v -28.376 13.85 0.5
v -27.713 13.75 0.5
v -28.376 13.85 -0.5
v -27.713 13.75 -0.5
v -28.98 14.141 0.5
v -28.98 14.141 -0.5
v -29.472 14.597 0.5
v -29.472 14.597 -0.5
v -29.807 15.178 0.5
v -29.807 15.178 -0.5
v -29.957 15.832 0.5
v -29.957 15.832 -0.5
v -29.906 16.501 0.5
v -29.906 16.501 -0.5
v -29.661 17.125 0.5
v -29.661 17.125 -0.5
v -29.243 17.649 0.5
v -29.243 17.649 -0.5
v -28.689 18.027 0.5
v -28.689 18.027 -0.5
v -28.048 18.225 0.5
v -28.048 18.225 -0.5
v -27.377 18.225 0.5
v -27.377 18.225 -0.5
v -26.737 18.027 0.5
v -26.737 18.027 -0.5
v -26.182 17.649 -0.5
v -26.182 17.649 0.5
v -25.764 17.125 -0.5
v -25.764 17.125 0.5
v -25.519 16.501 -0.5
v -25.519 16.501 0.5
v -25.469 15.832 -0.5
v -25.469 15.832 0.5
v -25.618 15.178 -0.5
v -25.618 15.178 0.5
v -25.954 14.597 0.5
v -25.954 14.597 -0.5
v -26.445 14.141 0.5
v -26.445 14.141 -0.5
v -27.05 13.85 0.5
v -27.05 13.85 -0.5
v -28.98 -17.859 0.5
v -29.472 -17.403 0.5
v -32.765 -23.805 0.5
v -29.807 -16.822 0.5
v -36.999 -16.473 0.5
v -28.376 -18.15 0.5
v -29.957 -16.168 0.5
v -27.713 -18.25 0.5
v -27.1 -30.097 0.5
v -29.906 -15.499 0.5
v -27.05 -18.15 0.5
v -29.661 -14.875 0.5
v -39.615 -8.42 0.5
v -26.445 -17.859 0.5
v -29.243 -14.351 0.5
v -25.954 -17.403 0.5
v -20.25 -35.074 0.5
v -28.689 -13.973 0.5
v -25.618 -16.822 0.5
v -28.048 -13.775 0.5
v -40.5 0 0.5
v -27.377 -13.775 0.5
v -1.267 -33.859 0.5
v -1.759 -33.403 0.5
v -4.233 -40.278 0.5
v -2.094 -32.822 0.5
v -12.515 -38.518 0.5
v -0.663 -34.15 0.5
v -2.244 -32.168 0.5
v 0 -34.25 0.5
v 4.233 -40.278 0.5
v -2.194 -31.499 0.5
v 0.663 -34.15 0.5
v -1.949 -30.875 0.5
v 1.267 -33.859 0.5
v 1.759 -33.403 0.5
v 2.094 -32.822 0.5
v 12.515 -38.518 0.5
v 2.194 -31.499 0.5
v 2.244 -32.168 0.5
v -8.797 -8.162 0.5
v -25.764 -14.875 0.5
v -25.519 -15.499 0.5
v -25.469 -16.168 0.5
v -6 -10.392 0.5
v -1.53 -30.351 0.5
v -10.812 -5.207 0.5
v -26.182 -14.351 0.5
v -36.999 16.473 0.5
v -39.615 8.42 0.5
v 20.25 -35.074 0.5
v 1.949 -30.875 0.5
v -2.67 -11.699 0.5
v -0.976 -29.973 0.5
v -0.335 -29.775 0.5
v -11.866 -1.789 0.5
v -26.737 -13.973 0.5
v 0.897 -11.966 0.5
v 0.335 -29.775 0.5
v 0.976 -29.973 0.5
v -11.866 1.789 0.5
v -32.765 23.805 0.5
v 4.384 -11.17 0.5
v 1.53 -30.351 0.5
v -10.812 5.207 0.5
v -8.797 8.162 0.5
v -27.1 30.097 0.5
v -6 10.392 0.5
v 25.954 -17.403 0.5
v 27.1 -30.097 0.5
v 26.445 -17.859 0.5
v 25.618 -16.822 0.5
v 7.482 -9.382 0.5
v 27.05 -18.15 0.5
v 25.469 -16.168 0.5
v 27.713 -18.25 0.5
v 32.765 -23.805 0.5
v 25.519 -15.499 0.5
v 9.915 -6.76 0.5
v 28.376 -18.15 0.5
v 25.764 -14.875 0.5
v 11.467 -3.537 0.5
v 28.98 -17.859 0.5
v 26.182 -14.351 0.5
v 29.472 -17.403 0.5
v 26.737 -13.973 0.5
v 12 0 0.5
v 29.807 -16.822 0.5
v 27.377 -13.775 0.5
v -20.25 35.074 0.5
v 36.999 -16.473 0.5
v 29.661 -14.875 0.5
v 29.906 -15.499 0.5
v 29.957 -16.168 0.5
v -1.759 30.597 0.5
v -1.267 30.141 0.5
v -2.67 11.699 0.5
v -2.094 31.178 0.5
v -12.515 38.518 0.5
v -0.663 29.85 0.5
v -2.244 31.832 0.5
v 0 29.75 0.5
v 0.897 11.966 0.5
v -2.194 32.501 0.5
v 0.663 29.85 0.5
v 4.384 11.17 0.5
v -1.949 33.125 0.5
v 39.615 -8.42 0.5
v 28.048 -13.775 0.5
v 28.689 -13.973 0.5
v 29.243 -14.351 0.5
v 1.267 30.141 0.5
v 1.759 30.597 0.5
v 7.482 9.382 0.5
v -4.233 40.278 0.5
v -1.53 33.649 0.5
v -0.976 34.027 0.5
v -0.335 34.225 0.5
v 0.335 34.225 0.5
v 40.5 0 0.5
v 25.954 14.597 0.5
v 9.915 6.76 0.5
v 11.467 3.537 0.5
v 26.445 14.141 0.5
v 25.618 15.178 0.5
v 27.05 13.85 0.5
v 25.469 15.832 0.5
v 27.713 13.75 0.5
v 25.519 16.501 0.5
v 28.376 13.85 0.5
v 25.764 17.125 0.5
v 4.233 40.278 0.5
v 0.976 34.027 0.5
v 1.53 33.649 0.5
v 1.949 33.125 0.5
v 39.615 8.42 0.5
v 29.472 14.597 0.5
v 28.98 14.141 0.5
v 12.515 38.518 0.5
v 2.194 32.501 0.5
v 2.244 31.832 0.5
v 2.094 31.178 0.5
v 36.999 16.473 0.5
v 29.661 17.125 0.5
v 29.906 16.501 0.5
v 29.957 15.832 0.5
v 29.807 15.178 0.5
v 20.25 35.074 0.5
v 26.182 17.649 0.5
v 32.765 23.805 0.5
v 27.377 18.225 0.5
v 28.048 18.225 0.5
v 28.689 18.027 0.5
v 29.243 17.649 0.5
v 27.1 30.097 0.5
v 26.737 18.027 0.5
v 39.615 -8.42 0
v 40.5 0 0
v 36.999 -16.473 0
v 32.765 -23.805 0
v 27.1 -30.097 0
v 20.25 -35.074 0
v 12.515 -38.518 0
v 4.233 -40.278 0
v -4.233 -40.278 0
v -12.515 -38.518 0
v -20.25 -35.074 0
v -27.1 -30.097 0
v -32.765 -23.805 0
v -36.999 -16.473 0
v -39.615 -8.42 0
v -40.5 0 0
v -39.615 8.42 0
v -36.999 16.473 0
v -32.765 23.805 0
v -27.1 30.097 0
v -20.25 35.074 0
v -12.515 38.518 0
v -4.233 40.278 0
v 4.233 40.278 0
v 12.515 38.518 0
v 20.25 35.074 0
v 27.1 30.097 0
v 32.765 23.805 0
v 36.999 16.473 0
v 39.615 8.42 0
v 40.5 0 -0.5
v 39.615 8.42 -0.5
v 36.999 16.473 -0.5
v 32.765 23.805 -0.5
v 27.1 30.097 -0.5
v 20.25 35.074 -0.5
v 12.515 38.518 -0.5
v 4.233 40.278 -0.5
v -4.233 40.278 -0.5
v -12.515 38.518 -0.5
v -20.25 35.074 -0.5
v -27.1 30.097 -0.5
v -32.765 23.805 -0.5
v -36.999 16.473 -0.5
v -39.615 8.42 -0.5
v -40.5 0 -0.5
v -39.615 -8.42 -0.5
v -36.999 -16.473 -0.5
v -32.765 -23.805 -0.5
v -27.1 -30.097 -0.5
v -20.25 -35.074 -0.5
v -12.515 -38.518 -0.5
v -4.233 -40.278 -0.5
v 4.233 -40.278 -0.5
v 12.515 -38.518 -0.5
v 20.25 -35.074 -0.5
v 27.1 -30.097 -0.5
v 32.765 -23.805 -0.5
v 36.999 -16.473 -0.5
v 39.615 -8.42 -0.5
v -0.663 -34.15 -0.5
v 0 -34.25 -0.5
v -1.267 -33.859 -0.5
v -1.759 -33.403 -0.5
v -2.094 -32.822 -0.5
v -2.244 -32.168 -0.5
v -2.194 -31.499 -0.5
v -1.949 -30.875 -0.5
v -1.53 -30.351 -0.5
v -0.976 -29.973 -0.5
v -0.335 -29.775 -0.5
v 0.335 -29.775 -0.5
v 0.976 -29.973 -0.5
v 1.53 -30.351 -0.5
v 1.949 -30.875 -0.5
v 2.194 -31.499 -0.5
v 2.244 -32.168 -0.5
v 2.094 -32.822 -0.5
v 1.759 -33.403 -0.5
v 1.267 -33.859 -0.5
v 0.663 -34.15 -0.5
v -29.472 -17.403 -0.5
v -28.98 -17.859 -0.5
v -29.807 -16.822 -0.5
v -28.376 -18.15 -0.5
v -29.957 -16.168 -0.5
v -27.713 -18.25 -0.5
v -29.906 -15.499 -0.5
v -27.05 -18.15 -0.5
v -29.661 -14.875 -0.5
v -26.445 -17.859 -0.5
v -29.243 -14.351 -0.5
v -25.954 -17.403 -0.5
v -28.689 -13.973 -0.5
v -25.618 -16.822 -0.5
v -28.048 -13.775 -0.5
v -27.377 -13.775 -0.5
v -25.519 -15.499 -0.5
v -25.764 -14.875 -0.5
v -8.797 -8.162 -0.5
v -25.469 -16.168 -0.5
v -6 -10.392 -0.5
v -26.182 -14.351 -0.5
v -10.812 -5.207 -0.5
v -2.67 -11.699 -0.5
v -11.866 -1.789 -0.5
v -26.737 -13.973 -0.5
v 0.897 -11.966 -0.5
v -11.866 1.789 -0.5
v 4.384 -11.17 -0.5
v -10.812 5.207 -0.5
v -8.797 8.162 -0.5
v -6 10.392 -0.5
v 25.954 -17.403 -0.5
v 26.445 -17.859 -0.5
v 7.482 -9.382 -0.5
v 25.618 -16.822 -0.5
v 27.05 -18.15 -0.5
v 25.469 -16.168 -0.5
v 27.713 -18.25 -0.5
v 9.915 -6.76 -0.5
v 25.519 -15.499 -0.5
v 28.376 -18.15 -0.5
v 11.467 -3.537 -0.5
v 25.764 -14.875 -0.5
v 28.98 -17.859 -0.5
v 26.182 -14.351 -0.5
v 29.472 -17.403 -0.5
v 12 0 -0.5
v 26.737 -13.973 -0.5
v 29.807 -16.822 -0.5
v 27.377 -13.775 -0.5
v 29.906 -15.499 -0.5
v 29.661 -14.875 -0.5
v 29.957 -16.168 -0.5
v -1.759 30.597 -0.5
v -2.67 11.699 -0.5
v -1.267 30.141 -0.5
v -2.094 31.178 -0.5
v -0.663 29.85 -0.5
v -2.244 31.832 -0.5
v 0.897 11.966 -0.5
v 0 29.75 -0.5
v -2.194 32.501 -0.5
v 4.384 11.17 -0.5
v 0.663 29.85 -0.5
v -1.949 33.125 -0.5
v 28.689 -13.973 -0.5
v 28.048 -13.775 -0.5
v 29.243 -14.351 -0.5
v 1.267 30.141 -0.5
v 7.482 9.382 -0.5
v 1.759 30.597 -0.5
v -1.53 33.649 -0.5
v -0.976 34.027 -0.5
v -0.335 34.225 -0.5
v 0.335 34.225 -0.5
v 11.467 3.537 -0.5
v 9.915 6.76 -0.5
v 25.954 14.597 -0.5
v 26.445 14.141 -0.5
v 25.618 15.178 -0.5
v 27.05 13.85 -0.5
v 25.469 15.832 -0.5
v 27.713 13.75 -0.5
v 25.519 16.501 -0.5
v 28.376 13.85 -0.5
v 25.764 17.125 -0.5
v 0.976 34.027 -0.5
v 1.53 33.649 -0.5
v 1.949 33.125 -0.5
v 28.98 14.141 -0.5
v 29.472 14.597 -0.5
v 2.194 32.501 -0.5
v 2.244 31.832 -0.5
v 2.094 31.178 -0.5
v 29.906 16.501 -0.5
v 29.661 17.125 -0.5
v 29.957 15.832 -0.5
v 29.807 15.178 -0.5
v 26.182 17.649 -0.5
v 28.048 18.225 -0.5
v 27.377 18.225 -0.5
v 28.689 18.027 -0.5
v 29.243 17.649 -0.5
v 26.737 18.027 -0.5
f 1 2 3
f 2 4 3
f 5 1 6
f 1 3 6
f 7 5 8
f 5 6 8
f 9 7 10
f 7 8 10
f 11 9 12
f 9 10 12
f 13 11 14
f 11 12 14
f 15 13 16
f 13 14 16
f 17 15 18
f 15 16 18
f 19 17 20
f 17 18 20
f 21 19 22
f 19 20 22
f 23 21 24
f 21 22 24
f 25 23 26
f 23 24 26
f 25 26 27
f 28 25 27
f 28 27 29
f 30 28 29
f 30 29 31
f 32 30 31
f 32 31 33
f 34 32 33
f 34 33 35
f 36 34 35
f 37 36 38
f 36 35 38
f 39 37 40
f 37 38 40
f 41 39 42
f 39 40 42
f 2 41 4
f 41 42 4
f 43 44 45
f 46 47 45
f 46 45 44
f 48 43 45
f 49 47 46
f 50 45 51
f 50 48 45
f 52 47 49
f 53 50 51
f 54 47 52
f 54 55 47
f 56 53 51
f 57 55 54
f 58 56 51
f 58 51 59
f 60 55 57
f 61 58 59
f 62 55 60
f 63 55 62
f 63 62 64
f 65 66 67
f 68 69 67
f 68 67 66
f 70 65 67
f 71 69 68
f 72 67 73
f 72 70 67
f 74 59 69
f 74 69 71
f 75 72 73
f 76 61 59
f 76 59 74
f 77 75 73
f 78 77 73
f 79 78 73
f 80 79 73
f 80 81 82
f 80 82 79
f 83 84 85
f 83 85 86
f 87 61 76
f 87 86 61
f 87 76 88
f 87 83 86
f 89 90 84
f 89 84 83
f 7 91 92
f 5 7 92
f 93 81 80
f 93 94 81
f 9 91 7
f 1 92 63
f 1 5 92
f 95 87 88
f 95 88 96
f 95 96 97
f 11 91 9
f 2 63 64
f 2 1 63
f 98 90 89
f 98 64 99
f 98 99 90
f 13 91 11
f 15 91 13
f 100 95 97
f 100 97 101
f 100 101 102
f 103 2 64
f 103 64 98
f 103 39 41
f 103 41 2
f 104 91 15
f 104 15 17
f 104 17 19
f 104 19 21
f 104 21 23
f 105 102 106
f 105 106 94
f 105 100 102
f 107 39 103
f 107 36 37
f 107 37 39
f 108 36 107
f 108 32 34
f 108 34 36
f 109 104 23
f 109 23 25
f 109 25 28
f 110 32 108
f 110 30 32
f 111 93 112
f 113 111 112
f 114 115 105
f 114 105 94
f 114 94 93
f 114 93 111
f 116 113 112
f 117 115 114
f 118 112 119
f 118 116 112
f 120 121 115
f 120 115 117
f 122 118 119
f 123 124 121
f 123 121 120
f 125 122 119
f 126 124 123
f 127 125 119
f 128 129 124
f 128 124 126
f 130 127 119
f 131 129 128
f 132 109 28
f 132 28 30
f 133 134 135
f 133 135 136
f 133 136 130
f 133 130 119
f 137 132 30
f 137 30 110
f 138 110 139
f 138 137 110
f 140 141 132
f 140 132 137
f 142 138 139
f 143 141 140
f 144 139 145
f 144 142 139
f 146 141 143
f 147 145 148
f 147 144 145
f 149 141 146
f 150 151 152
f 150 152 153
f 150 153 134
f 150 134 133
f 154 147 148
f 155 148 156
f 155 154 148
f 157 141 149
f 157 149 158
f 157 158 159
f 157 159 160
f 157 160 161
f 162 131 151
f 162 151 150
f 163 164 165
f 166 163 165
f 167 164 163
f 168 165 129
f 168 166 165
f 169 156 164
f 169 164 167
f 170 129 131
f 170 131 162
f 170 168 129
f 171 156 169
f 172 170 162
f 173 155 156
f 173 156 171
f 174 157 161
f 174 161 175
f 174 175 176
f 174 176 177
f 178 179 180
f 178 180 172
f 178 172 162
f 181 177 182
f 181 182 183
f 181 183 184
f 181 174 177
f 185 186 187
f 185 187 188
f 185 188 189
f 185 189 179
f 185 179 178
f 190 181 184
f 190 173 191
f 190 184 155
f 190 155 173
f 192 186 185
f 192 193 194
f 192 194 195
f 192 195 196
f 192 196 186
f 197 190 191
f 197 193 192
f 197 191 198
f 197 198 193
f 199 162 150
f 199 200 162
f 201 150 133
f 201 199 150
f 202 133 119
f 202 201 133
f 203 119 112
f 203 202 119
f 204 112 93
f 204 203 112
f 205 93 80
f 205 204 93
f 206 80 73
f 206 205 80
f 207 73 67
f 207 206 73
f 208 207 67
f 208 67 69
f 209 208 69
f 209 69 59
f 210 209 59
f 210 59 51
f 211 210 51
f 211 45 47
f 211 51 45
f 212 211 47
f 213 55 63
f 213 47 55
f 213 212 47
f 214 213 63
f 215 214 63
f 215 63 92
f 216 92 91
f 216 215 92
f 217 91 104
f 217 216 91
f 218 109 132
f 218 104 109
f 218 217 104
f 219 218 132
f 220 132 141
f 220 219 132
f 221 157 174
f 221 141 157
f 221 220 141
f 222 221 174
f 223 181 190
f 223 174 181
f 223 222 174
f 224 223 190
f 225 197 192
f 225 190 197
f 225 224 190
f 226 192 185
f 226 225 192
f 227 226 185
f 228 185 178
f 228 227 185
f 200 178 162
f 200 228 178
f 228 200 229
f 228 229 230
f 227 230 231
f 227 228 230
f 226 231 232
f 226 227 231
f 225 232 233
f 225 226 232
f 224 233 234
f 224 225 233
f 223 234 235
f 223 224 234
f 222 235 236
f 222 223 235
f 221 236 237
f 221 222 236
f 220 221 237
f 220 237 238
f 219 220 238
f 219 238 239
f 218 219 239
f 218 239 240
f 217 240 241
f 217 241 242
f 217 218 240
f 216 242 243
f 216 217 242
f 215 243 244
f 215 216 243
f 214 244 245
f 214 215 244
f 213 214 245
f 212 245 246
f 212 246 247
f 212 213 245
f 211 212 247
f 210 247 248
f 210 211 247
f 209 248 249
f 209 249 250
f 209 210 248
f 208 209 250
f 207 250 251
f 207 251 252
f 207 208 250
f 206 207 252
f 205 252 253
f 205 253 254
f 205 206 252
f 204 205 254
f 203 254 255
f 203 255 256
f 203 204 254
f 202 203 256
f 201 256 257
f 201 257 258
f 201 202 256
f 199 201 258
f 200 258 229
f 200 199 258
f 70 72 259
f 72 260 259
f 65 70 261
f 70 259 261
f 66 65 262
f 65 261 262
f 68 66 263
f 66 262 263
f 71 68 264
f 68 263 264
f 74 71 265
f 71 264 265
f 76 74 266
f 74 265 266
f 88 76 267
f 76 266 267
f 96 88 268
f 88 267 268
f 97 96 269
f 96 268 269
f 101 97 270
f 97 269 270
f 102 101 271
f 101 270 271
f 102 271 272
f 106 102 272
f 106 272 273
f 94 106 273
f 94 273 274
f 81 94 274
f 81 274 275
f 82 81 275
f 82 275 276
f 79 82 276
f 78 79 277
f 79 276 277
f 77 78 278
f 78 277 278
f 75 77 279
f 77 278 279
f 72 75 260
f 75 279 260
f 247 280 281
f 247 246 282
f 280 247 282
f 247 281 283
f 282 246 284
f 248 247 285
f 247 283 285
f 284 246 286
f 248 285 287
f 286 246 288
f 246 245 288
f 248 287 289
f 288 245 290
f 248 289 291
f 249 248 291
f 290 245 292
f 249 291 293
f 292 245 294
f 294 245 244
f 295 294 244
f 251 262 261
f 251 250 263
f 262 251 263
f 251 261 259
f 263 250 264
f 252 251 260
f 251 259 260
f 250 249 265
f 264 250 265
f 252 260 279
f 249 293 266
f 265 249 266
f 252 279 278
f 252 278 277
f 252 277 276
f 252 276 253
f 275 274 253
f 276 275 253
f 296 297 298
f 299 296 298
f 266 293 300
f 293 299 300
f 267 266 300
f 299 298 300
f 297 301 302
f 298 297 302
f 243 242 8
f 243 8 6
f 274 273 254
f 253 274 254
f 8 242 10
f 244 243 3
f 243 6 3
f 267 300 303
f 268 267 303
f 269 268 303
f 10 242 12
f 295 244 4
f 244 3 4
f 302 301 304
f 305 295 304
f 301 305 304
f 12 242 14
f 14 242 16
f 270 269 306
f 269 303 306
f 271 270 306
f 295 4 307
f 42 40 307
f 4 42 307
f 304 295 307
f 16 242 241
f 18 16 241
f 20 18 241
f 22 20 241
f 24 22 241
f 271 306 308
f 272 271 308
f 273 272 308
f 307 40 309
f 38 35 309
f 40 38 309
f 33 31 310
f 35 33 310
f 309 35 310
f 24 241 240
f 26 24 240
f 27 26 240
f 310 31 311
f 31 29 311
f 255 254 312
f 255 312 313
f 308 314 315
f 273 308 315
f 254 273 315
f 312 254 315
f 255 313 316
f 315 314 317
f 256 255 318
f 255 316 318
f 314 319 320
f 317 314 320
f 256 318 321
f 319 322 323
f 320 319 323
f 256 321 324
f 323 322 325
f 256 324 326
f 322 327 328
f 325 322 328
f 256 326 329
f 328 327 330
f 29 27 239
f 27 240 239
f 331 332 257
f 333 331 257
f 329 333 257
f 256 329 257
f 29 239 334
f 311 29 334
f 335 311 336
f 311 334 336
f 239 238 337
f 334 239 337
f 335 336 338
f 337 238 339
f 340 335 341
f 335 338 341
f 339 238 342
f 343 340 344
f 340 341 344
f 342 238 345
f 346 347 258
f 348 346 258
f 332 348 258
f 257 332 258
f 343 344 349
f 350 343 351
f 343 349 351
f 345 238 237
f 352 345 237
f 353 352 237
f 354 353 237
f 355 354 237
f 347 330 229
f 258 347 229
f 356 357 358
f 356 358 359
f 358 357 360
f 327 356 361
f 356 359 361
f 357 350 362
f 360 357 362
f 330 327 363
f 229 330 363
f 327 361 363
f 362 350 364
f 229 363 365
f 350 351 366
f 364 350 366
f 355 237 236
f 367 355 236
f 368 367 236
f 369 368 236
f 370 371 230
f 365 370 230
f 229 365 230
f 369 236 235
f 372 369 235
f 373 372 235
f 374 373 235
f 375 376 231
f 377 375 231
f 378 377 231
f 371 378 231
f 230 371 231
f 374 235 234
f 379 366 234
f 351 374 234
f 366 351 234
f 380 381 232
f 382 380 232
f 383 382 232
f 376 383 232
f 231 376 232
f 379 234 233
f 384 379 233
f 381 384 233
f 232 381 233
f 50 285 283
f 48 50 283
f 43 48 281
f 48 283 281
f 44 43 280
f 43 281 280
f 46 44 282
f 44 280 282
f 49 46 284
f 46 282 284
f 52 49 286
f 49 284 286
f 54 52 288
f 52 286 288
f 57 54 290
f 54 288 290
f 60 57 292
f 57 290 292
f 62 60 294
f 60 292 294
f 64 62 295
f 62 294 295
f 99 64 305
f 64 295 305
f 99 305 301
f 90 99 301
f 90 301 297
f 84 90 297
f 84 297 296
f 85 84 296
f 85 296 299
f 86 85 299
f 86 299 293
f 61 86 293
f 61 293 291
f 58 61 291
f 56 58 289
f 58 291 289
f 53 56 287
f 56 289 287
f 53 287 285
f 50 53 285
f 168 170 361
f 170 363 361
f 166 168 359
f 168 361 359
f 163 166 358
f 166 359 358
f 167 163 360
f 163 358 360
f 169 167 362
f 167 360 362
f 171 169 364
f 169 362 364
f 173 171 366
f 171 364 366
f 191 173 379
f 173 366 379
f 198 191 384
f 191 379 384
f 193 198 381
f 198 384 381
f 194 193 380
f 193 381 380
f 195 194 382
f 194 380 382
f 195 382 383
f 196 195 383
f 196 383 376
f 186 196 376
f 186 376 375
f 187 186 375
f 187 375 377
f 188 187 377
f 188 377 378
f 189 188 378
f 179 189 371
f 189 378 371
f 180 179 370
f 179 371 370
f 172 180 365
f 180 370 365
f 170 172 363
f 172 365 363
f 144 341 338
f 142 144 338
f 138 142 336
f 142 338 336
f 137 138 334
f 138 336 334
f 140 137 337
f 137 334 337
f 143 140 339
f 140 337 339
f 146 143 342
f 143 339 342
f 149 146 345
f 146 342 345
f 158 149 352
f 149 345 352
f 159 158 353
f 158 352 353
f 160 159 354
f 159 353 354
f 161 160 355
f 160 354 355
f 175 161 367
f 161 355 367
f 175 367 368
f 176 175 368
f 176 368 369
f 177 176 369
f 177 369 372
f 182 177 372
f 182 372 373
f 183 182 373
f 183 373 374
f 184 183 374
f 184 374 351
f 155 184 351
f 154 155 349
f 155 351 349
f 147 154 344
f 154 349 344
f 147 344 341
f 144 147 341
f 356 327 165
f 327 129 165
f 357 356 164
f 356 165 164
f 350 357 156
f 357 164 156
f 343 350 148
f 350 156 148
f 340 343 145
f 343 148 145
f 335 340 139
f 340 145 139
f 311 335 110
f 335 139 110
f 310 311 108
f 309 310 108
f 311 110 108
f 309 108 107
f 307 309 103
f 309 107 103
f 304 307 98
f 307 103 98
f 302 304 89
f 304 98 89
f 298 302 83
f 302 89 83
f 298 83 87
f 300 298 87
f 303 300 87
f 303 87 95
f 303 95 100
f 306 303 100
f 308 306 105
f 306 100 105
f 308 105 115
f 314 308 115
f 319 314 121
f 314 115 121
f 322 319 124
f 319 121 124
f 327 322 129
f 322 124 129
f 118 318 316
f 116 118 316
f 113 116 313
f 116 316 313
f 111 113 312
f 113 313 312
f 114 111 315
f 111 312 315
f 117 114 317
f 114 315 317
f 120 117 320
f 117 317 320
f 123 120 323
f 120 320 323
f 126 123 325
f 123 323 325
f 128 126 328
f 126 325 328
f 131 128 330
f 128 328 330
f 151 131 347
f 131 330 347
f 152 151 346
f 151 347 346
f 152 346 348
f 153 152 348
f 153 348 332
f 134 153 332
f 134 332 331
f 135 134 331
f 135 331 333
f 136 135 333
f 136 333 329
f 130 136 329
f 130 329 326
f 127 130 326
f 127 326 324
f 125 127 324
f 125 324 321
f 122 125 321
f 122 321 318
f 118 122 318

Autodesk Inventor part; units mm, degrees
ref_plane "YZ Plane" through (0, 0, 0) normal (1, 0, 0) x (0, 1, 0)
ref_plane "XZ Plane" through (0, 0, 0) normal (0, 1, 0) x (-1, 0, 0)
ref_plane "XY Plane" through (0, 0, 0) normal (0, 0, 1) x (1, 0, 0)
sketch "スケッチ1" plane through (0, 0, 0) normal (0, 0, 1) x (1, 0, 0)
  circle A0 centre (0, 0) radius 40.5
  dimension "d0" = 81
extrude "プレート1" add sketch "スケッチ1" along normal mid plane 1
sketch "スケッチ2" plane through (0, 0, 0.5) normal (0, 0, 1) x (1, 0, 0)
  circle A0 centre (0, 0) radius 12
  dimension "d2" = 24
extrude "押し出し1" cut sketch "スケッチ2" against normal blind 10
sketch "スケッチ3" plane through (0, 0, 0.5) normal (0, 0, 1) x (1, 0, 0)
  circle A0 centre (0, 0) radius 32
  point P0 (0, 32)
  point P1 (-27.7128, 16)
  point P2 (-27.7128, -16)
  point P3 (0, -32)
  point P4 (27.7128, -16)
  point P5 (27.7128, 16)
  dimension "d5" = 64
  dimension "d8" = 360
hole "穴1" at (0, 32, 0.5) at (-27.7128, 16, 0.5) at (-27.7128, -16, 0.5) at (0, -32, 0.5) at (27.7128, -16, 0.5) at (27.7128, 16, 0.5) direction (0, 0, -1) diameter 4.5 end through all clearance for "Flat Head Machine Screw" size "M4" standard "Ansi Metric M Profile"
equation "\"d15\" = Thickness"
equation "\"d1\" = Thickness"
equation "\"BendRadius\" = Thickness"
equation "\"BendReliefWidth\" = Thickness"
equation "\"BendReliefDepth\" = 0.5 * Thickness"
equation "\"CornerReliefSize\" = 4 * Thickness"
equation "\"MinimumRemnant\" = 2 * Thickness"
equation "\"TransitionRadius\" = BendRadius"
equation "\"JacobiRadiusSize\" = BendRadius"
equation "\"GapSize\" = Thickness"
equation "\"Thickness\" = 1"
properties part number "unit-plate1" material "CFRP"
